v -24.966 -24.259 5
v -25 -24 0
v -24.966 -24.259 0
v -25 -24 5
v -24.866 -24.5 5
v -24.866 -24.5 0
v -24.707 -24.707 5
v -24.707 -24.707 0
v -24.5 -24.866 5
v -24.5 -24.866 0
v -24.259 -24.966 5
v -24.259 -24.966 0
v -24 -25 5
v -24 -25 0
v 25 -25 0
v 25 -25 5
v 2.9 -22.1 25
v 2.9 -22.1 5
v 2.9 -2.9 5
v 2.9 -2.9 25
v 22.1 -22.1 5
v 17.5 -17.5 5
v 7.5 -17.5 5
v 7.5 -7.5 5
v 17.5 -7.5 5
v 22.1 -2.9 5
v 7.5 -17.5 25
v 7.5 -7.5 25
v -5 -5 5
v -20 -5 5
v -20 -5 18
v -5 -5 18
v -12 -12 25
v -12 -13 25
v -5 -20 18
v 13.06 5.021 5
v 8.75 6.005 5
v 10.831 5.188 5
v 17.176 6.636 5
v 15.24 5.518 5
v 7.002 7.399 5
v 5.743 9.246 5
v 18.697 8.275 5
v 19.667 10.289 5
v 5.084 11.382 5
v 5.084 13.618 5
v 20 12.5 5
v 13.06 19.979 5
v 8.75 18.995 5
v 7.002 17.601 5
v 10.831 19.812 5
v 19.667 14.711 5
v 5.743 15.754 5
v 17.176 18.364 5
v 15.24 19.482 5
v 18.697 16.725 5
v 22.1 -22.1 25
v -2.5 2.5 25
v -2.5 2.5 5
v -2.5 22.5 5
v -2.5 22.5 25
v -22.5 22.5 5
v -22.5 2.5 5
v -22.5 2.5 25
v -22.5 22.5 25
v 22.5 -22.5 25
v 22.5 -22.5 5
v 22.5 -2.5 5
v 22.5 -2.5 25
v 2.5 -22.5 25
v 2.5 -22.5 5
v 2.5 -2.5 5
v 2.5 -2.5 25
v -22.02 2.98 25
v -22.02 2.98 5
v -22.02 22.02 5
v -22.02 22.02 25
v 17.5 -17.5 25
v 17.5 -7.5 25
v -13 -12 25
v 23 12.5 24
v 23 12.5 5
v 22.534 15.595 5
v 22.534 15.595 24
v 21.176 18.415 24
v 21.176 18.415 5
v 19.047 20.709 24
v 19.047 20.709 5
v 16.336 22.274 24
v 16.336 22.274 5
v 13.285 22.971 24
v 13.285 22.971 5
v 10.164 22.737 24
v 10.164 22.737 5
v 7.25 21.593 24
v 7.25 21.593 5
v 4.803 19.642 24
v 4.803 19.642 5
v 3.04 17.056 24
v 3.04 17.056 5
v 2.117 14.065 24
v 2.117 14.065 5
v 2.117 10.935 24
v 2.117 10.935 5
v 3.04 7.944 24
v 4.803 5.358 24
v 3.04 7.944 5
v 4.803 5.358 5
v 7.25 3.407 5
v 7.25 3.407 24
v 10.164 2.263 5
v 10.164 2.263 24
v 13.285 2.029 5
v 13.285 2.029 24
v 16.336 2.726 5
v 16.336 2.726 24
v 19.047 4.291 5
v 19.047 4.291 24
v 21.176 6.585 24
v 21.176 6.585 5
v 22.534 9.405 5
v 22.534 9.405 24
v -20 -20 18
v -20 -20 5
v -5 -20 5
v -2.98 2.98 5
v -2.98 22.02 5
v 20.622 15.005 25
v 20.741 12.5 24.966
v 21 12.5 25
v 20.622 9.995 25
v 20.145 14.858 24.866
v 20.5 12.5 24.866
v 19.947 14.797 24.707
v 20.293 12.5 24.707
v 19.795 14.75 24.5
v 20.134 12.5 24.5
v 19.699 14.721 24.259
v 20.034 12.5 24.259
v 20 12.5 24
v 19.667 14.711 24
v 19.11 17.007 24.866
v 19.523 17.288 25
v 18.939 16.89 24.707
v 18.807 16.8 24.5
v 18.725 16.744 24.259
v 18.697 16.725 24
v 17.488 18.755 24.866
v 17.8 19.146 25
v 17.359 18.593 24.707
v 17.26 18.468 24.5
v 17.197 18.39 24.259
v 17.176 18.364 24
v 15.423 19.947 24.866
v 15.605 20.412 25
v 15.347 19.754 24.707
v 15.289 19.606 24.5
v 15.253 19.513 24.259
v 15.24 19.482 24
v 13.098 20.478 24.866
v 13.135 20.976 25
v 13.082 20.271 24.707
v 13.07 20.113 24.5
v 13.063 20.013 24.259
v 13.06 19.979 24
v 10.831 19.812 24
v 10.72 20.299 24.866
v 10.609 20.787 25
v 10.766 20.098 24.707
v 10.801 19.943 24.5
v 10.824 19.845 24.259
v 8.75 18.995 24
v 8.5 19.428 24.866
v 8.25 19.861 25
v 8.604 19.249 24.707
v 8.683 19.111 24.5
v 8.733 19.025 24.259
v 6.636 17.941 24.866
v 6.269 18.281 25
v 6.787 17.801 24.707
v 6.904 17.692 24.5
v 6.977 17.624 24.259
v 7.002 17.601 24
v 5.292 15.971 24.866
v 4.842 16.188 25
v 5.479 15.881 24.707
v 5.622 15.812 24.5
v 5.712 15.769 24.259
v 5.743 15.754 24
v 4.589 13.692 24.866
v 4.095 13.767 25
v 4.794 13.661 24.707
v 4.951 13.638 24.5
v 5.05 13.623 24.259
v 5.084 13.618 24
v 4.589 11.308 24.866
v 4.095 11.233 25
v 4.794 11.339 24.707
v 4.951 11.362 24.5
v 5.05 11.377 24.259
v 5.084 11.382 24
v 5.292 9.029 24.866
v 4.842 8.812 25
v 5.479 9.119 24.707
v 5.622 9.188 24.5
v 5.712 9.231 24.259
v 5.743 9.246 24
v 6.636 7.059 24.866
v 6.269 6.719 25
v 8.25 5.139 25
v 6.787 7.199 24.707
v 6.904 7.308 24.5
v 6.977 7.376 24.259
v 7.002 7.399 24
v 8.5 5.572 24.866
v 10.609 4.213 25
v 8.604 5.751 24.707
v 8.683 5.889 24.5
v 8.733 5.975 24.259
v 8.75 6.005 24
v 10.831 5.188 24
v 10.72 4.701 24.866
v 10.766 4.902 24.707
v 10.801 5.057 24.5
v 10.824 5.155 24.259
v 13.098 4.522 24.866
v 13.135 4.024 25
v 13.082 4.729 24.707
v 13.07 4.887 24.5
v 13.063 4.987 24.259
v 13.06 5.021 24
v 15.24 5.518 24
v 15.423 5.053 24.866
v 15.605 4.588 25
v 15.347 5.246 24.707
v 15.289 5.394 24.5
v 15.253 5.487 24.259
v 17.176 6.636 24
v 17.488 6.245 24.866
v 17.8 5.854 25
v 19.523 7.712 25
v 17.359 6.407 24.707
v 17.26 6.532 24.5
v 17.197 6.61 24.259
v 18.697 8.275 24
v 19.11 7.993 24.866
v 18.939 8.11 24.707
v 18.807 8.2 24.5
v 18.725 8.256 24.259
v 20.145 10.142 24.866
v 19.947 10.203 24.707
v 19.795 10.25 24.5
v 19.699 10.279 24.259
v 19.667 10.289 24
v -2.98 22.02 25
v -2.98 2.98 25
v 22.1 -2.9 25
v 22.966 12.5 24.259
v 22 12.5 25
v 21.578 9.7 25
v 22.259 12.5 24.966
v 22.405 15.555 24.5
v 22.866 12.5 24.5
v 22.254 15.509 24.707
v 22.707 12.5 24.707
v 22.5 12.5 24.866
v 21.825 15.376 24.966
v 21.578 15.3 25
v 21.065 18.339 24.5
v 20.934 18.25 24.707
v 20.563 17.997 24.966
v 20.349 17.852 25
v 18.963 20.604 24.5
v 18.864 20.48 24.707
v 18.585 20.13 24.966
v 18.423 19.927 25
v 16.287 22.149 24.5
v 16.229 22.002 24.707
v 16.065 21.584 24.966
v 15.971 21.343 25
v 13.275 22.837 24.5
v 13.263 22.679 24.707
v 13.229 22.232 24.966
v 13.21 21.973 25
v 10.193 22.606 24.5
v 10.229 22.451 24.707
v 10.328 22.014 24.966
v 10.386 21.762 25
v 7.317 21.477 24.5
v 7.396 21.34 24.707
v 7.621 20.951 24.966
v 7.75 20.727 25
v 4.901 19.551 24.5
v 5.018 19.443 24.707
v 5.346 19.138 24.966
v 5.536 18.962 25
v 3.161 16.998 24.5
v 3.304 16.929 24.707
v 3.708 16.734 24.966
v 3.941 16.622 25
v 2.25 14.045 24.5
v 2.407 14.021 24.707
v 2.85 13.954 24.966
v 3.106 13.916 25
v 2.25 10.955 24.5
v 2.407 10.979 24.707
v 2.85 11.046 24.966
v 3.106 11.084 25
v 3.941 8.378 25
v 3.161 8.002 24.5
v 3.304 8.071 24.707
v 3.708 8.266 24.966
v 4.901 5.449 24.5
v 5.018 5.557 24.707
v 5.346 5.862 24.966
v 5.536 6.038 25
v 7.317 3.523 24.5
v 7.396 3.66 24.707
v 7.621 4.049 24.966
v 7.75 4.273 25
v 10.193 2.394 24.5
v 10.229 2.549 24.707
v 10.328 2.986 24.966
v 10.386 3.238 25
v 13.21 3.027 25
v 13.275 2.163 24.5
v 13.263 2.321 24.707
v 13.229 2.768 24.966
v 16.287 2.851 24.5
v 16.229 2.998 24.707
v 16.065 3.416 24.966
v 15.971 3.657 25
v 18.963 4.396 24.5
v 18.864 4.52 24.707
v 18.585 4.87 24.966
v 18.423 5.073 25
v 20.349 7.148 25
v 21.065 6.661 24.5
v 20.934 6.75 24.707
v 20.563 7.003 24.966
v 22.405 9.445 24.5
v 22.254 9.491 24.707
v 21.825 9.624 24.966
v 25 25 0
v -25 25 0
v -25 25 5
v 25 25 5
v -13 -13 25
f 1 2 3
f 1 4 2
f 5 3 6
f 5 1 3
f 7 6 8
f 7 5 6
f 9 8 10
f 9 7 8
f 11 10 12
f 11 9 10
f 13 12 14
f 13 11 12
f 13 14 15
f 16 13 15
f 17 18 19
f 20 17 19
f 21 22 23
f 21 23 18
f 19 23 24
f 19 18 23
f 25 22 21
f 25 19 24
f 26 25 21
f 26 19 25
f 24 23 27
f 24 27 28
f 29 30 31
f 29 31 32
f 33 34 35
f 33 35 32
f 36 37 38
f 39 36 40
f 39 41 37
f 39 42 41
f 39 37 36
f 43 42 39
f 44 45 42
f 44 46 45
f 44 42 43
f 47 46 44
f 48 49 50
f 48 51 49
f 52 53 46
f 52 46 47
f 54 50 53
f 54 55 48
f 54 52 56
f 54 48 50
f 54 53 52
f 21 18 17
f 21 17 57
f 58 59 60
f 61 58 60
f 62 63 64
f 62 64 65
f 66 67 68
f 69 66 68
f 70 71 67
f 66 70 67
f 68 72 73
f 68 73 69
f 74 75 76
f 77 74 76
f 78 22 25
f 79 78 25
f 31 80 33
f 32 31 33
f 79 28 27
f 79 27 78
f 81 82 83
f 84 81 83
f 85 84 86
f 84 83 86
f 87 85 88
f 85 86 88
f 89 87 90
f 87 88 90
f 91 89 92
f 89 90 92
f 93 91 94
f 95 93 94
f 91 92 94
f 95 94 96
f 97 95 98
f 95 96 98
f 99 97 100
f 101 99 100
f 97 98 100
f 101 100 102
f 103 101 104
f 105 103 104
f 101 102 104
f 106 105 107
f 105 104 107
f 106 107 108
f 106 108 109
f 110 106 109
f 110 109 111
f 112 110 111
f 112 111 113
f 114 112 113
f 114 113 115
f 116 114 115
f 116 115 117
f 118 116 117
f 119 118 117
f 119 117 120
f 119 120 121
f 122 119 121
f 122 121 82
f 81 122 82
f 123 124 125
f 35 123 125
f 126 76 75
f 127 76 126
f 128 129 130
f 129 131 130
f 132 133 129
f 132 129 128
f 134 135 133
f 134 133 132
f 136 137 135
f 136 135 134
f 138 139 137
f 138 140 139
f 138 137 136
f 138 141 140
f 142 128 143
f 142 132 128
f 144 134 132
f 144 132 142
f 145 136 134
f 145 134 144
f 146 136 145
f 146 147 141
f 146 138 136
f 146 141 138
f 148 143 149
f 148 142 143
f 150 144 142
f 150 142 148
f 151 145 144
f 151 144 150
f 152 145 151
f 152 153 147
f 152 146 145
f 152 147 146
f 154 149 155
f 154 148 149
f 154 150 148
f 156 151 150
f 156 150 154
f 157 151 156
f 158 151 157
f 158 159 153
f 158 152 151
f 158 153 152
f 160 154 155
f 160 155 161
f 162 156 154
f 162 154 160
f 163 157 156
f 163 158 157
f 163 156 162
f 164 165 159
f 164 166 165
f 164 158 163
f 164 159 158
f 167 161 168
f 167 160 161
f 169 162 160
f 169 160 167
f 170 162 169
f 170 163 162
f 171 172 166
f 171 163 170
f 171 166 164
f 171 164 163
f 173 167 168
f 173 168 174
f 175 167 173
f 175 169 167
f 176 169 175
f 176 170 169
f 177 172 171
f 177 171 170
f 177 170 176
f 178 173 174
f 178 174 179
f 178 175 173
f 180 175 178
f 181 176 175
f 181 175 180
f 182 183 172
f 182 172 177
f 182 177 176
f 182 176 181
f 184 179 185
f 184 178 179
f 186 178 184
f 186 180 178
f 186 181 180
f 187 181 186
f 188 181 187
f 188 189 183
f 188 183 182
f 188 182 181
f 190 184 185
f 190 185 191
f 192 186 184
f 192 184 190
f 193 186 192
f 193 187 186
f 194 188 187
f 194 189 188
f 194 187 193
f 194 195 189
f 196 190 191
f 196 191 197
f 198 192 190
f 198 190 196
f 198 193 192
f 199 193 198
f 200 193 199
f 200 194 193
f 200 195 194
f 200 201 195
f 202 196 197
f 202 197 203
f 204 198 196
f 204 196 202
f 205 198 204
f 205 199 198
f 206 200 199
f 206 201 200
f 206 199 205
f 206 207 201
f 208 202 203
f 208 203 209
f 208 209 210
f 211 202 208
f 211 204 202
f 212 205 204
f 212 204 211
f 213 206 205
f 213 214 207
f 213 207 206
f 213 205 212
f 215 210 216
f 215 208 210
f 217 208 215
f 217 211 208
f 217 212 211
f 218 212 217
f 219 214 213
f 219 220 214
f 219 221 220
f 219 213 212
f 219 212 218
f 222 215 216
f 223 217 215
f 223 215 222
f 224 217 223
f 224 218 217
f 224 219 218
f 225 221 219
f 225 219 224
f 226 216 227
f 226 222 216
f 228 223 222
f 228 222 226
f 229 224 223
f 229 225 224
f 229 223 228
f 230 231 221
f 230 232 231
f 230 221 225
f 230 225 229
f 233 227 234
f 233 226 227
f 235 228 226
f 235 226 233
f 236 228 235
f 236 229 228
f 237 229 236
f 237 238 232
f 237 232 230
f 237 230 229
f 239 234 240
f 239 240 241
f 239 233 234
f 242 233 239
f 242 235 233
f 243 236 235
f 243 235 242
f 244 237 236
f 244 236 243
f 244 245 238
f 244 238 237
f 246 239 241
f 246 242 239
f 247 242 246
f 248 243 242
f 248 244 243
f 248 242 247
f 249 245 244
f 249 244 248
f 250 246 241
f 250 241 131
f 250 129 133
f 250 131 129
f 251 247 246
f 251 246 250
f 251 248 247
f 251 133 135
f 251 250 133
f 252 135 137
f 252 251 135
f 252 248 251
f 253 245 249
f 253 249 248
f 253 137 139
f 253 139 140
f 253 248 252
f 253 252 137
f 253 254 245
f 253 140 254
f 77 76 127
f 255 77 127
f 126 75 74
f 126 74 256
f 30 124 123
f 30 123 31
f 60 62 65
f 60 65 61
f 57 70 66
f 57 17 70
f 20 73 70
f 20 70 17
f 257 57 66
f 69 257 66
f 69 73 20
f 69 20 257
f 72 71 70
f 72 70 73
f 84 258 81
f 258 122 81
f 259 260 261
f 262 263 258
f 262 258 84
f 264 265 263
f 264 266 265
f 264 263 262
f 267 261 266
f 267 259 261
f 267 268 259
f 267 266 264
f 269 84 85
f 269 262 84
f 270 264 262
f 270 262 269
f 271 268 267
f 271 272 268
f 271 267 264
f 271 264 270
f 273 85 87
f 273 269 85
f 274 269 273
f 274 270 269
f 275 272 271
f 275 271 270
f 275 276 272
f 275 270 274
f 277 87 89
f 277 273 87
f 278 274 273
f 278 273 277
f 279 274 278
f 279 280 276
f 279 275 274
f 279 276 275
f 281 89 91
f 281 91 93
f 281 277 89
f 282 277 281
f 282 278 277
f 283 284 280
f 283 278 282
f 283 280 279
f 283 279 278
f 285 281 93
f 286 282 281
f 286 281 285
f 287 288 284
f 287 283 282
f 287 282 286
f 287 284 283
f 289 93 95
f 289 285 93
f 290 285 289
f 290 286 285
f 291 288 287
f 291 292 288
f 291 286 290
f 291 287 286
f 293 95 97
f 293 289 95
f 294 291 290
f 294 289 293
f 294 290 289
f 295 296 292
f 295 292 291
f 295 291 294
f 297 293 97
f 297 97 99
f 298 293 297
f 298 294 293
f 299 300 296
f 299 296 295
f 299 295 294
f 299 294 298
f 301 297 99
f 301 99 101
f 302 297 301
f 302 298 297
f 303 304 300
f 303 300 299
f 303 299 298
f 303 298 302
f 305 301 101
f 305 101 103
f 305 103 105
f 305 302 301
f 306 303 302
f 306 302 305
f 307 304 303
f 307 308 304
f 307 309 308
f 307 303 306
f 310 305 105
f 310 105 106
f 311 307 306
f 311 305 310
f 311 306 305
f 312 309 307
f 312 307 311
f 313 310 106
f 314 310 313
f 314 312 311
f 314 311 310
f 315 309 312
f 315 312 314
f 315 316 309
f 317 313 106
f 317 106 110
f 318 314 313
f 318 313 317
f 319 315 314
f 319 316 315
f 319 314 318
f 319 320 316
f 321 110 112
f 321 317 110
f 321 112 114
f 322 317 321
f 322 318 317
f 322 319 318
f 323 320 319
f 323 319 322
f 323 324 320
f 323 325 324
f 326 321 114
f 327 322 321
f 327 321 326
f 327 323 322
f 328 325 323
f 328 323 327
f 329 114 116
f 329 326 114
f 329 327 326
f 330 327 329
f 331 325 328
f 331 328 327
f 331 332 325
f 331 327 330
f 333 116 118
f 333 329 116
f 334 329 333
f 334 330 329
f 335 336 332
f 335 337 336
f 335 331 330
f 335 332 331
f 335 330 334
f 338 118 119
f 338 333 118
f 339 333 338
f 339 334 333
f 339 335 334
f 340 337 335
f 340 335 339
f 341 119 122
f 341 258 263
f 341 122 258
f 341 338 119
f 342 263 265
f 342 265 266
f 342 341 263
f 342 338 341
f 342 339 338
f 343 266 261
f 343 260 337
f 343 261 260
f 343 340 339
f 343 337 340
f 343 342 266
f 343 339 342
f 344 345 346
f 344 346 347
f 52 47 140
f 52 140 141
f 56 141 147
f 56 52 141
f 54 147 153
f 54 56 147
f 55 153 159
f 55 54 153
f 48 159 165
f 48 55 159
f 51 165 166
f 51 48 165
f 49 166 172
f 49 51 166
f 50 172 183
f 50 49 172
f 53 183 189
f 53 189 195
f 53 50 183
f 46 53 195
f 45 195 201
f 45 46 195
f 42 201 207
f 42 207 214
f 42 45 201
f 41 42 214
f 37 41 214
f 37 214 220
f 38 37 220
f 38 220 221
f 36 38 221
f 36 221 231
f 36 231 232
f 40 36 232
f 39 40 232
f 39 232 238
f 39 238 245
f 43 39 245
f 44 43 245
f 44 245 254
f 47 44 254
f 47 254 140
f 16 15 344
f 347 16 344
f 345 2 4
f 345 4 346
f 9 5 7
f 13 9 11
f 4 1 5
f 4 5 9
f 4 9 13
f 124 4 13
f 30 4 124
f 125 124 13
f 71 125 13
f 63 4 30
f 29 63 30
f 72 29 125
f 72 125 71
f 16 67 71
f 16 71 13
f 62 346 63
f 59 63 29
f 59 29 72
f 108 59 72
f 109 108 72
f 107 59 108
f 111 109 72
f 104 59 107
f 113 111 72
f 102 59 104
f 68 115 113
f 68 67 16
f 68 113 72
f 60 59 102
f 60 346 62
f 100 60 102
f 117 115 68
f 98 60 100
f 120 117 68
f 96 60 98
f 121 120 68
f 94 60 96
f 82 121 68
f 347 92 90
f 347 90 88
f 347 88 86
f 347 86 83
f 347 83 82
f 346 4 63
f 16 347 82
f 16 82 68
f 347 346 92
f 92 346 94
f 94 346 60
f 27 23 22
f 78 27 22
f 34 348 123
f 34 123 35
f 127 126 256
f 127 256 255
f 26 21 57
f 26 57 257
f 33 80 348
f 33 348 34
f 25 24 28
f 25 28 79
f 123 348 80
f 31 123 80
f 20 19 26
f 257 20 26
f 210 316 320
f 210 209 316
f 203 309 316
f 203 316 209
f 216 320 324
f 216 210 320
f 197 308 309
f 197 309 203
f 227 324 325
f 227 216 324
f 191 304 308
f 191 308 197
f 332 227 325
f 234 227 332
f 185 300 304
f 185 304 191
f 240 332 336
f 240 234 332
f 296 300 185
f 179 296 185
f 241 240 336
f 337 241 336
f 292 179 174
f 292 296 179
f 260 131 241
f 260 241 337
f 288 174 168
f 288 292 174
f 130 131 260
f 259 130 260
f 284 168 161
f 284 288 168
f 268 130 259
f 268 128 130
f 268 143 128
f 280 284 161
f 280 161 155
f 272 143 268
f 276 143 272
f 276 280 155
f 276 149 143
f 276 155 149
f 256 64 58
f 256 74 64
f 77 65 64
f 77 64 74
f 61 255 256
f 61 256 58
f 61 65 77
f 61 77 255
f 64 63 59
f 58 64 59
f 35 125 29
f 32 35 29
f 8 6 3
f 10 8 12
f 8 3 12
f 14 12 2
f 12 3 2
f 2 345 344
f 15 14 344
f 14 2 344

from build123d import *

# Parameters (mm, degrees)
F0_W     = 50
F0_H     = 50
F0_W_2   = 15
F0_H_2   = 15
F0_W_3   = 20
F0_H_3   = 20
F0_R     = 10.5
F0_W_4   = 19.04
F0_H_4   = 19.04
F0_W_5   = 19.2
F0_H_5   = 19.2
F0_W_6   = 10
F0_H_6   = 10
F0_R_2   = 7.5
F1_DEPTH = 5
F2_DEPTH = 25
F3_DEPTH = 25
F4_DEPTH = 25
F5_DEPTH = 25
F6_R     = 1
F7_SIZE  = 7


with BuildPart() as f1:
    # F0 (on Top) → F1 (new body)
    with BuildSketch(Plane.XY):
        Rectangle(F0_W, F0_H)
        with Locations((-12.5, -12.5)):
            Rectangle(F0_W_2, F0_H_2, mode=Mode.SUBTRACT)
        with Locations((12.5, -12.5)):
            Rectangle(F0_W_3, F0_H_3, mode=Mode.SUBTRACT)
        with Locations((-12.5, 12.500000177)):
            Rectangle(F0_W_3, F0_H_3, mode=Mode.SUBTRACT)
        with Locations((12.5, 12.500000177)):
            Circle(F0_R, mode=Mode.SUBTRACT)
        with Locations((-12.5, 12.500000177)):
            Rectangle(F0_W_3, F0_H_3)
        with Locations((-12.5, 12.500000177)):
            Rectangle(F0_W_4, F0_H_4, mode=Mode.SUBTRACT)
        with Locations((12.5, -12.5)):
            Rectangle(F0_W_3, F0_H_3)
        with Locations((12.5, -12.5)):
            Rectangle(F0_W_5, F0_H_5, mode=Mode.SUBTRACT)
        with Locations((12.5, -12.5)):
            Rectangle(F0_W_5, F0_H_5)
        with Locations((12.5, -12.5)):
            Rectangle(F0_W_6, F0_H_6, mode=Mode.SUBTRACT)
        with Locations((-12.5, 12.500000177)):
            Rectangle(F0_W_4, F0_H_4)
        with Locations((12.5, 12.500000177)):
            Circle(F0_R)
        with Locations((12.5, 12.500000177)):
            Circle(F0_R_2, mode=Mode.SUBTRACT)
        with Locations((-12.5, -12.5)):
            Rectangle(F0_W_2, F0_H_2)
        with Locations((12.5, 12.500000177)):
            Circle(F0_R_2)
        with Locations((12.5, -12.5)):
            Rectangle(F0_W_6, F0_H_6)
    extrude(amount=F1_DEPTH)

    # F0 (on Top) → F2 (join)
    with BuildSketch(Plane.XY):
        with Locations((-12.5, 12.500000177)):
            Rectangle(F0_W_3, F0_H_3)
        with Locations((-12.5, 12.500000177)):
            Rectangle(F0_W_4, F0_H_4, mode=Mode.SUBTRACT)
    extrude(amount=F2_DEPTH)

    # F0 (on Top) → F3 (join)
    with BuildSketch(Plane.XY):
        with Locations((12.5, -12.5)):
            Rectangle(F0_W_3, F0_H_3)
        with Locations((12.5, -12.5)):
            Rectangle(F0_W_5, F0_H_5, mode=Mode.SUBTRACT)
        with Locations((12.5, -12.5)):
            Rectangle(F0_W_6, F0_H_6)
    extrude(amount=F3_DEPTH)

    # F0 (on Top) → F4 (join)
    with BuildSketch(Plane.XY):
        with Locations((-12.5, -12.5)):
            Rectangle(F0_W_2, F0_H_2)
    extrude(amount=F4_DEPTH)

    # F0 (on Top) → F5 (join)
    with BuildSketch(Plane.XY):
        with Locations((12.5, 12.500000177)):
            Circle(F0_R)
        with Locations((12.5, 12.500000177)):
            Circle(F0_R_2, mode=Mode.SUBTRACT)
    extrude(amount=F5_DEPTH)

    # F6
    f6_edges = [f1.edges().sort_by_distance(p)[0] for p in [
        (-25, -25, 2.5),
        (2, 12.5, 25),
        (5, 12.5, 25),
    ]]
    fillet(f6_edges, radius=F6_R)

    # F7
    f7_edges = [f1.edges().sort_by_distance(p)[0] for p in [
        (-12.5, -5, 25),
        (-20, -12.5, 25),
        (-12.5, -20, 25),
        (-5, -12.5, 25),
    ]]
    chamfer(f7_edges, length=F7_SIZE)


solid = f1.part
